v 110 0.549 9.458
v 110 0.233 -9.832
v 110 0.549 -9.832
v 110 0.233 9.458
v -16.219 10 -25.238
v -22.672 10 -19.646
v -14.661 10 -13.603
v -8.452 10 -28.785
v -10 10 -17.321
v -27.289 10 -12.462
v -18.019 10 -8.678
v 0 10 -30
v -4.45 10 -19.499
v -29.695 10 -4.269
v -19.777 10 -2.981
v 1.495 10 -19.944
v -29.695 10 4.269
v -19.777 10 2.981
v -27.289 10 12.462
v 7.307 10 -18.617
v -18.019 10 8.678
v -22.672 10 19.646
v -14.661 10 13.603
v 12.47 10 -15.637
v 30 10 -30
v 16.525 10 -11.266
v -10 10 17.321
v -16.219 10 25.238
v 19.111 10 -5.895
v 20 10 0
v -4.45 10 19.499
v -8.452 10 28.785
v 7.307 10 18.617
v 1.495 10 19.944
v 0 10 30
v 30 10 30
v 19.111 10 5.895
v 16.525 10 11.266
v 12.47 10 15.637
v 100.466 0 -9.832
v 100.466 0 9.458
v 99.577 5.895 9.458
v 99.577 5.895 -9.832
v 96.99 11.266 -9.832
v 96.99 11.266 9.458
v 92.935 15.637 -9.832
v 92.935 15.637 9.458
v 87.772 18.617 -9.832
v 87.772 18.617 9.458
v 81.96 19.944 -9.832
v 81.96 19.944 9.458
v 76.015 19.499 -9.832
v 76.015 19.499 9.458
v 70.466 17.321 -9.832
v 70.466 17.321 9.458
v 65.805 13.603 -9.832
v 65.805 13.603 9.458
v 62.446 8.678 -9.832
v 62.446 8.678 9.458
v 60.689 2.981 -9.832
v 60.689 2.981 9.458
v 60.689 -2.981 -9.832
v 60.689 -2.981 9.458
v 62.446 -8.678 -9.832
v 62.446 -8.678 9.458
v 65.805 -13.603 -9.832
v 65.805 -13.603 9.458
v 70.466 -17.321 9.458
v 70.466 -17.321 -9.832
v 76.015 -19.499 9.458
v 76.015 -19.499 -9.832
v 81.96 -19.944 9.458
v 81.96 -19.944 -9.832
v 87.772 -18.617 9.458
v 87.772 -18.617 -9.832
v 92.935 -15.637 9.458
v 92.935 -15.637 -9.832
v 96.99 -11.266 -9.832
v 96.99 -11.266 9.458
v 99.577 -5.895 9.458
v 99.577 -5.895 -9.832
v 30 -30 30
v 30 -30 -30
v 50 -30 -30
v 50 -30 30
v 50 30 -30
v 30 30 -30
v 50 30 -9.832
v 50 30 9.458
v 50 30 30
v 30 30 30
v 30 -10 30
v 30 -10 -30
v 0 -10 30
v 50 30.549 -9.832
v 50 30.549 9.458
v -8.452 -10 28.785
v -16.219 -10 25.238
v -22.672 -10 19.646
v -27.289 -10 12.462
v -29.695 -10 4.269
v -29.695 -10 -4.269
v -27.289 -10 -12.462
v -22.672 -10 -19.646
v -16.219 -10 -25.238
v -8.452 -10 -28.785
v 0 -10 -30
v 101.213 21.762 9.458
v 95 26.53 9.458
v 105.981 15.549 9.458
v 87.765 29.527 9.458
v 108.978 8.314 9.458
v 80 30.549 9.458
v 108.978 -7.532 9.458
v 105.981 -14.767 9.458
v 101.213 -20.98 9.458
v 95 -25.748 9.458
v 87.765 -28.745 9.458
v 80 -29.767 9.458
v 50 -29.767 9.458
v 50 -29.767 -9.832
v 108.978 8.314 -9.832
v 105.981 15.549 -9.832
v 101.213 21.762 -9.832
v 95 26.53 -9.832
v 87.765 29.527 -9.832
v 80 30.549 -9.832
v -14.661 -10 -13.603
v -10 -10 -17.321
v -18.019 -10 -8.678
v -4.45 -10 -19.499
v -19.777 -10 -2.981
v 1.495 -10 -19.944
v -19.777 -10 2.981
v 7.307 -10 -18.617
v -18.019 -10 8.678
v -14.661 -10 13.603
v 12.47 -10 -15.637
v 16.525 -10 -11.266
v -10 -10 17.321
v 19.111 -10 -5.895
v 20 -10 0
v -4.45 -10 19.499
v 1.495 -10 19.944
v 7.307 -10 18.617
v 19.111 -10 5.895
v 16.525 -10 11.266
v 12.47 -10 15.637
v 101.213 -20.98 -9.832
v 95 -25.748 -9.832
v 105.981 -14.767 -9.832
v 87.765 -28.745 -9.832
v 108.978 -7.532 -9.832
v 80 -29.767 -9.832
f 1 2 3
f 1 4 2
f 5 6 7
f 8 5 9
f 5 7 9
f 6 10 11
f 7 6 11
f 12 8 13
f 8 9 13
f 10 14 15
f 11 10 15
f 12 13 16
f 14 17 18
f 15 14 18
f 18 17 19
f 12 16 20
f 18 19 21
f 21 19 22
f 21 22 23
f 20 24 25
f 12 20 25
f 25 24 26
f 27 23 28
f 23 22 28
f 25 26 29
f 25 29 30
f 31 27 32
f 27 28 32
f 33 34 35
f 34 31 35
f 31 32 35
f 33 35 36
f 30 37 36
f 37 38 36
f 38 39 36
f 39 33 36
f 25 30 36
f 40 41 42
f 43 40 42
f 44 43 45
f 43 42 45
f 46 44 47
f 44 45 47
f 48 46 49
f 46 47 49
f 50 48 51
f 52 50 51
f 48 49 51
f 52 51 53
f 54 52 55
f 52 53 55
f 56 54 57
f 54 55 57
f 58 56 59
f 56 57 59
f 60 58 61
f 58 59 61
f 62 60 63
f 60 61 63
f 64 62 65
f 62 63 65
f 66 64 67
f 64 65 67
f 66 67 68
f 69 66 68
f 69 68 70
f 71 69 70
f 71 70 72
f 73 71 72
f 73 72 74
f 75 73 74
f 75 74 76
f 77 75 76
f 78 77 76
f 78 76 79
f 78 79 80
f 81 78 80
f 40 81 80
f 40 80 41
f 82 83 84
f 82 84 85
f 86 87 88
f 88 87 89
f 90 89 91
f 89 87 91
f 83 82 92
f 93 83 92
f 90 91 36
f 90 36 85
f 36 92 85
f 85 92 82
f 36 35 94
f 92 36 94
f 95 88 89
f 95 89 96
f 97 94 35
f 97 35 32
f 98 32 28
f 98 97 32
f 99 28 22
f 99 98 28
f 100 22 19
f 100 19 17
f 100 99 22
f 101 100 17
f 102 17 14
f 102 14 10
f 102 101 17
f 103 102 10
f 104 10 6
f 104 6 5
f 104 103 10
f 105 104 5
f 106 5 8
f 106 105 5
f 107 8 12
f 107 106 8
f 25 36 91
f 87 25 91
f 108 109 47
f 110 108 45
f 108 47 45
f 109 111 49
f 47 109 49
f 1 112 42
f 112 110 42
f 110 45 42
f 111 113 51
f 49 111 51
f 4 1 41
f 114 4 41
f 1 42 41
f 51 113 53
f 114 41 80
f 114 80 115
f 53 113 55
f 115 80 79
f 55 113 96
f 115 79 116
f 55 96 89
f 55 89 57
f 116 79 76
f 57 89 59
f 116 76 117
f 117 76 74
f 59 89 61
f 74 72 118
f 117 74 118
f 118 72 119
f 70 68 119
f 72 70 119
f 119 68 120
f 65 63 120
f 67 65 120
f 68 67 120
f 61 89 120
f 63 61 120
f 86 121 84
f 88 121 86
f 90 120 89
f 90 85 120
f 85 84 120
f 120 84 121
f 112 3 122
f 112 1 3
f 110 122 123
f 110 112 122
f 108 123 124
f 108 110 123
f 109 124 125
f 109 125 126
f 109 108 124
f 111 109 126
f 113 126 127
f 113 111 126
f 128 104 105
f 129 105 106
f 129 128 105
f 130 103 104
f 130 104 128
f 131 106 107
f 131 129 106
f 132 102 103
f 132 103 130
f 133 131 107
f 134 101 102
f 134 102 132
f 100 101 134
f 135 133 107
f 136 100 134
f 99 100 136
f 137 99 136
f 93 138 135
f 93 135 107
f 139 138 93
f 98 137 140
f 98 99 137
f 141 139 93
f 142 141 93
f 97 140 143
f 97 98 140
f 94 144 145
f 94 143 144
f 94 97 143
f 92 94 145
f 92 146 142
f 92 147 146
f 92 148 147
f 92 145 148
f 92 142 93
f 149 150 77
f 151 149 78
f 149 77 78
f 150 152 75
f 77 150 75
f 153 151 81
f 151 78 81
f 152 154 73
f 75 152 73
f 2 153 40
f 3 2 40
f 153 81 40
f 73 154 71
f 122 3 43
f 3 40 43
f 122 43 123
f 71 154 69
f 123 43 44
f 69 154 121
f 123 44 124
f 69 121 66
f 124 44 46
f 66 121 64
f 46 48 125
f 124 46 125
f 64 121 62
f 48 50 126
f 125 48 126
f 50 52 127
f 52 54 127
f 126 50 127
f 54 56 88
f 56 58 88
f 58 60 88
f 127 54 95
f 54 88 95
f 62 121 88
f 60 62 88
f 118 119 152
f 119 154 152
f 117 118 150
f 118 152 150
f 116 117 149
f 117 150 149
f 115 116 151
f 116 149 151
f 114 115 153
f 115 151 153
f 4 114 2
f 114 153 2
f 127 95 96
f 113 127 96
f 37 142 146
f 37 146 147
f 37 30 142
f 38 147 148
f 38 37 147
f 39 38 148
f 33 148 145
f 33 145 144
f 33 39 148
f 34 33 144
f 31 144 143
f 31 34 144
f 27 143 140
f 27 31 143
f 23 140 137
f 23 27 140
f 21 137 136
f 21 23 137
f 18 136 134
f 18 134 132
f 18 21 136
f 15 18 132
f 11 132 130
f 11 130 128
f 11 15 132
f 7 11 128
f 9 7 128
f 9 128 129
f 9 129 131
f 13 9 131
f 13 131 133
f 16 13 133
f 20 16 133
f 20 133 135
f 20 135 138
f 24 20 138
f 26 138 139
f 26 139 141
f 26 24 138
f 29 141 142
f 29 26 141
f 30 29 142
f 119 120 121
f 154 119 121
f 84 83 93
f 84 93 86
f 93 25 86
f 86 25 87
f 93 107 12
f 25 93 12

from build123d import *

# Parameters (mm, degrees)
F8_R          = 20
F0_DEPTH      = 10
F0_DEPTH_BACK = 10
F1_W          = 20
F1_H          = 60
F2_DEPTH      = 20
F9_DEPTH      = 60
F6_R          = 20
F10_DEPTH     = 25
F7_R          = 30


with BuildPart() as f0:
    # F8 (on Front) → F0 (new body, two sides)
    with BuildSketch(Plane.XZ) as f0_sk:
        with BuildLine():
            Line((30, 30), (0, 30))
            ThreePointArc((0, 30), (-30, 0), (0, -30))
            Line((0, -30), (30, -30))
            Line((30, -30), (30, 30))
        make_face()
        Circle(F8_R, mode=Mode.SUBTRACT)
    extrude(amount=F0_DEPTH)
    extrude(f0_sk.sketch, amount=-F0_DEPTH_BACK)

    # F1 (on face) → F2 (join)
    with BuildSketch(Plane.YZ.offset(30)):
        with Locations((-20, 0)):
            Rectangle(F1_W, F1_H)
        with Locations((20, 0)):
            Rectangle(F1_W, F1_H)
        Polygon((10, 30), (0, 30), (-10, 30), (-10, -30), (0, -30), (10, -30), align=None)
    extrude(amount=F2_DEPTH)

    # F5 (on offset) → F9 (join)
    with BuildSketch(Plane.YZ.offset(50)):
        Polygon((-29.7670396838, 9.4578760595), (-29.7670396838, -0.5421239405), (-29.7670396838, -9.8316618399), (30.5491250266, -9.8316618399), (30.5491250266, 9.4578760595), align=None)
    extrude(amount=F9_DEPTH)

    # F6 (on face) → F10 (cut)
    with BuildSketch(Plane.XY.offset(9.4578760595)):
        with Locations((80.4655393111, 0)):
            Circle(F6_R)
    extrude(amount=-F10_DEPTH, mode=Mode.SUBTRACT)

    # F7
    f7_edges = [f0.edges().sort_by_distance(p)[0] for p in [
        (110, -29.76704, -0.186893),
        (110, 30.549125, -0.186893),
    ]]
    fillet(f7_edges, radius=F7_R)


solid = f0.part
